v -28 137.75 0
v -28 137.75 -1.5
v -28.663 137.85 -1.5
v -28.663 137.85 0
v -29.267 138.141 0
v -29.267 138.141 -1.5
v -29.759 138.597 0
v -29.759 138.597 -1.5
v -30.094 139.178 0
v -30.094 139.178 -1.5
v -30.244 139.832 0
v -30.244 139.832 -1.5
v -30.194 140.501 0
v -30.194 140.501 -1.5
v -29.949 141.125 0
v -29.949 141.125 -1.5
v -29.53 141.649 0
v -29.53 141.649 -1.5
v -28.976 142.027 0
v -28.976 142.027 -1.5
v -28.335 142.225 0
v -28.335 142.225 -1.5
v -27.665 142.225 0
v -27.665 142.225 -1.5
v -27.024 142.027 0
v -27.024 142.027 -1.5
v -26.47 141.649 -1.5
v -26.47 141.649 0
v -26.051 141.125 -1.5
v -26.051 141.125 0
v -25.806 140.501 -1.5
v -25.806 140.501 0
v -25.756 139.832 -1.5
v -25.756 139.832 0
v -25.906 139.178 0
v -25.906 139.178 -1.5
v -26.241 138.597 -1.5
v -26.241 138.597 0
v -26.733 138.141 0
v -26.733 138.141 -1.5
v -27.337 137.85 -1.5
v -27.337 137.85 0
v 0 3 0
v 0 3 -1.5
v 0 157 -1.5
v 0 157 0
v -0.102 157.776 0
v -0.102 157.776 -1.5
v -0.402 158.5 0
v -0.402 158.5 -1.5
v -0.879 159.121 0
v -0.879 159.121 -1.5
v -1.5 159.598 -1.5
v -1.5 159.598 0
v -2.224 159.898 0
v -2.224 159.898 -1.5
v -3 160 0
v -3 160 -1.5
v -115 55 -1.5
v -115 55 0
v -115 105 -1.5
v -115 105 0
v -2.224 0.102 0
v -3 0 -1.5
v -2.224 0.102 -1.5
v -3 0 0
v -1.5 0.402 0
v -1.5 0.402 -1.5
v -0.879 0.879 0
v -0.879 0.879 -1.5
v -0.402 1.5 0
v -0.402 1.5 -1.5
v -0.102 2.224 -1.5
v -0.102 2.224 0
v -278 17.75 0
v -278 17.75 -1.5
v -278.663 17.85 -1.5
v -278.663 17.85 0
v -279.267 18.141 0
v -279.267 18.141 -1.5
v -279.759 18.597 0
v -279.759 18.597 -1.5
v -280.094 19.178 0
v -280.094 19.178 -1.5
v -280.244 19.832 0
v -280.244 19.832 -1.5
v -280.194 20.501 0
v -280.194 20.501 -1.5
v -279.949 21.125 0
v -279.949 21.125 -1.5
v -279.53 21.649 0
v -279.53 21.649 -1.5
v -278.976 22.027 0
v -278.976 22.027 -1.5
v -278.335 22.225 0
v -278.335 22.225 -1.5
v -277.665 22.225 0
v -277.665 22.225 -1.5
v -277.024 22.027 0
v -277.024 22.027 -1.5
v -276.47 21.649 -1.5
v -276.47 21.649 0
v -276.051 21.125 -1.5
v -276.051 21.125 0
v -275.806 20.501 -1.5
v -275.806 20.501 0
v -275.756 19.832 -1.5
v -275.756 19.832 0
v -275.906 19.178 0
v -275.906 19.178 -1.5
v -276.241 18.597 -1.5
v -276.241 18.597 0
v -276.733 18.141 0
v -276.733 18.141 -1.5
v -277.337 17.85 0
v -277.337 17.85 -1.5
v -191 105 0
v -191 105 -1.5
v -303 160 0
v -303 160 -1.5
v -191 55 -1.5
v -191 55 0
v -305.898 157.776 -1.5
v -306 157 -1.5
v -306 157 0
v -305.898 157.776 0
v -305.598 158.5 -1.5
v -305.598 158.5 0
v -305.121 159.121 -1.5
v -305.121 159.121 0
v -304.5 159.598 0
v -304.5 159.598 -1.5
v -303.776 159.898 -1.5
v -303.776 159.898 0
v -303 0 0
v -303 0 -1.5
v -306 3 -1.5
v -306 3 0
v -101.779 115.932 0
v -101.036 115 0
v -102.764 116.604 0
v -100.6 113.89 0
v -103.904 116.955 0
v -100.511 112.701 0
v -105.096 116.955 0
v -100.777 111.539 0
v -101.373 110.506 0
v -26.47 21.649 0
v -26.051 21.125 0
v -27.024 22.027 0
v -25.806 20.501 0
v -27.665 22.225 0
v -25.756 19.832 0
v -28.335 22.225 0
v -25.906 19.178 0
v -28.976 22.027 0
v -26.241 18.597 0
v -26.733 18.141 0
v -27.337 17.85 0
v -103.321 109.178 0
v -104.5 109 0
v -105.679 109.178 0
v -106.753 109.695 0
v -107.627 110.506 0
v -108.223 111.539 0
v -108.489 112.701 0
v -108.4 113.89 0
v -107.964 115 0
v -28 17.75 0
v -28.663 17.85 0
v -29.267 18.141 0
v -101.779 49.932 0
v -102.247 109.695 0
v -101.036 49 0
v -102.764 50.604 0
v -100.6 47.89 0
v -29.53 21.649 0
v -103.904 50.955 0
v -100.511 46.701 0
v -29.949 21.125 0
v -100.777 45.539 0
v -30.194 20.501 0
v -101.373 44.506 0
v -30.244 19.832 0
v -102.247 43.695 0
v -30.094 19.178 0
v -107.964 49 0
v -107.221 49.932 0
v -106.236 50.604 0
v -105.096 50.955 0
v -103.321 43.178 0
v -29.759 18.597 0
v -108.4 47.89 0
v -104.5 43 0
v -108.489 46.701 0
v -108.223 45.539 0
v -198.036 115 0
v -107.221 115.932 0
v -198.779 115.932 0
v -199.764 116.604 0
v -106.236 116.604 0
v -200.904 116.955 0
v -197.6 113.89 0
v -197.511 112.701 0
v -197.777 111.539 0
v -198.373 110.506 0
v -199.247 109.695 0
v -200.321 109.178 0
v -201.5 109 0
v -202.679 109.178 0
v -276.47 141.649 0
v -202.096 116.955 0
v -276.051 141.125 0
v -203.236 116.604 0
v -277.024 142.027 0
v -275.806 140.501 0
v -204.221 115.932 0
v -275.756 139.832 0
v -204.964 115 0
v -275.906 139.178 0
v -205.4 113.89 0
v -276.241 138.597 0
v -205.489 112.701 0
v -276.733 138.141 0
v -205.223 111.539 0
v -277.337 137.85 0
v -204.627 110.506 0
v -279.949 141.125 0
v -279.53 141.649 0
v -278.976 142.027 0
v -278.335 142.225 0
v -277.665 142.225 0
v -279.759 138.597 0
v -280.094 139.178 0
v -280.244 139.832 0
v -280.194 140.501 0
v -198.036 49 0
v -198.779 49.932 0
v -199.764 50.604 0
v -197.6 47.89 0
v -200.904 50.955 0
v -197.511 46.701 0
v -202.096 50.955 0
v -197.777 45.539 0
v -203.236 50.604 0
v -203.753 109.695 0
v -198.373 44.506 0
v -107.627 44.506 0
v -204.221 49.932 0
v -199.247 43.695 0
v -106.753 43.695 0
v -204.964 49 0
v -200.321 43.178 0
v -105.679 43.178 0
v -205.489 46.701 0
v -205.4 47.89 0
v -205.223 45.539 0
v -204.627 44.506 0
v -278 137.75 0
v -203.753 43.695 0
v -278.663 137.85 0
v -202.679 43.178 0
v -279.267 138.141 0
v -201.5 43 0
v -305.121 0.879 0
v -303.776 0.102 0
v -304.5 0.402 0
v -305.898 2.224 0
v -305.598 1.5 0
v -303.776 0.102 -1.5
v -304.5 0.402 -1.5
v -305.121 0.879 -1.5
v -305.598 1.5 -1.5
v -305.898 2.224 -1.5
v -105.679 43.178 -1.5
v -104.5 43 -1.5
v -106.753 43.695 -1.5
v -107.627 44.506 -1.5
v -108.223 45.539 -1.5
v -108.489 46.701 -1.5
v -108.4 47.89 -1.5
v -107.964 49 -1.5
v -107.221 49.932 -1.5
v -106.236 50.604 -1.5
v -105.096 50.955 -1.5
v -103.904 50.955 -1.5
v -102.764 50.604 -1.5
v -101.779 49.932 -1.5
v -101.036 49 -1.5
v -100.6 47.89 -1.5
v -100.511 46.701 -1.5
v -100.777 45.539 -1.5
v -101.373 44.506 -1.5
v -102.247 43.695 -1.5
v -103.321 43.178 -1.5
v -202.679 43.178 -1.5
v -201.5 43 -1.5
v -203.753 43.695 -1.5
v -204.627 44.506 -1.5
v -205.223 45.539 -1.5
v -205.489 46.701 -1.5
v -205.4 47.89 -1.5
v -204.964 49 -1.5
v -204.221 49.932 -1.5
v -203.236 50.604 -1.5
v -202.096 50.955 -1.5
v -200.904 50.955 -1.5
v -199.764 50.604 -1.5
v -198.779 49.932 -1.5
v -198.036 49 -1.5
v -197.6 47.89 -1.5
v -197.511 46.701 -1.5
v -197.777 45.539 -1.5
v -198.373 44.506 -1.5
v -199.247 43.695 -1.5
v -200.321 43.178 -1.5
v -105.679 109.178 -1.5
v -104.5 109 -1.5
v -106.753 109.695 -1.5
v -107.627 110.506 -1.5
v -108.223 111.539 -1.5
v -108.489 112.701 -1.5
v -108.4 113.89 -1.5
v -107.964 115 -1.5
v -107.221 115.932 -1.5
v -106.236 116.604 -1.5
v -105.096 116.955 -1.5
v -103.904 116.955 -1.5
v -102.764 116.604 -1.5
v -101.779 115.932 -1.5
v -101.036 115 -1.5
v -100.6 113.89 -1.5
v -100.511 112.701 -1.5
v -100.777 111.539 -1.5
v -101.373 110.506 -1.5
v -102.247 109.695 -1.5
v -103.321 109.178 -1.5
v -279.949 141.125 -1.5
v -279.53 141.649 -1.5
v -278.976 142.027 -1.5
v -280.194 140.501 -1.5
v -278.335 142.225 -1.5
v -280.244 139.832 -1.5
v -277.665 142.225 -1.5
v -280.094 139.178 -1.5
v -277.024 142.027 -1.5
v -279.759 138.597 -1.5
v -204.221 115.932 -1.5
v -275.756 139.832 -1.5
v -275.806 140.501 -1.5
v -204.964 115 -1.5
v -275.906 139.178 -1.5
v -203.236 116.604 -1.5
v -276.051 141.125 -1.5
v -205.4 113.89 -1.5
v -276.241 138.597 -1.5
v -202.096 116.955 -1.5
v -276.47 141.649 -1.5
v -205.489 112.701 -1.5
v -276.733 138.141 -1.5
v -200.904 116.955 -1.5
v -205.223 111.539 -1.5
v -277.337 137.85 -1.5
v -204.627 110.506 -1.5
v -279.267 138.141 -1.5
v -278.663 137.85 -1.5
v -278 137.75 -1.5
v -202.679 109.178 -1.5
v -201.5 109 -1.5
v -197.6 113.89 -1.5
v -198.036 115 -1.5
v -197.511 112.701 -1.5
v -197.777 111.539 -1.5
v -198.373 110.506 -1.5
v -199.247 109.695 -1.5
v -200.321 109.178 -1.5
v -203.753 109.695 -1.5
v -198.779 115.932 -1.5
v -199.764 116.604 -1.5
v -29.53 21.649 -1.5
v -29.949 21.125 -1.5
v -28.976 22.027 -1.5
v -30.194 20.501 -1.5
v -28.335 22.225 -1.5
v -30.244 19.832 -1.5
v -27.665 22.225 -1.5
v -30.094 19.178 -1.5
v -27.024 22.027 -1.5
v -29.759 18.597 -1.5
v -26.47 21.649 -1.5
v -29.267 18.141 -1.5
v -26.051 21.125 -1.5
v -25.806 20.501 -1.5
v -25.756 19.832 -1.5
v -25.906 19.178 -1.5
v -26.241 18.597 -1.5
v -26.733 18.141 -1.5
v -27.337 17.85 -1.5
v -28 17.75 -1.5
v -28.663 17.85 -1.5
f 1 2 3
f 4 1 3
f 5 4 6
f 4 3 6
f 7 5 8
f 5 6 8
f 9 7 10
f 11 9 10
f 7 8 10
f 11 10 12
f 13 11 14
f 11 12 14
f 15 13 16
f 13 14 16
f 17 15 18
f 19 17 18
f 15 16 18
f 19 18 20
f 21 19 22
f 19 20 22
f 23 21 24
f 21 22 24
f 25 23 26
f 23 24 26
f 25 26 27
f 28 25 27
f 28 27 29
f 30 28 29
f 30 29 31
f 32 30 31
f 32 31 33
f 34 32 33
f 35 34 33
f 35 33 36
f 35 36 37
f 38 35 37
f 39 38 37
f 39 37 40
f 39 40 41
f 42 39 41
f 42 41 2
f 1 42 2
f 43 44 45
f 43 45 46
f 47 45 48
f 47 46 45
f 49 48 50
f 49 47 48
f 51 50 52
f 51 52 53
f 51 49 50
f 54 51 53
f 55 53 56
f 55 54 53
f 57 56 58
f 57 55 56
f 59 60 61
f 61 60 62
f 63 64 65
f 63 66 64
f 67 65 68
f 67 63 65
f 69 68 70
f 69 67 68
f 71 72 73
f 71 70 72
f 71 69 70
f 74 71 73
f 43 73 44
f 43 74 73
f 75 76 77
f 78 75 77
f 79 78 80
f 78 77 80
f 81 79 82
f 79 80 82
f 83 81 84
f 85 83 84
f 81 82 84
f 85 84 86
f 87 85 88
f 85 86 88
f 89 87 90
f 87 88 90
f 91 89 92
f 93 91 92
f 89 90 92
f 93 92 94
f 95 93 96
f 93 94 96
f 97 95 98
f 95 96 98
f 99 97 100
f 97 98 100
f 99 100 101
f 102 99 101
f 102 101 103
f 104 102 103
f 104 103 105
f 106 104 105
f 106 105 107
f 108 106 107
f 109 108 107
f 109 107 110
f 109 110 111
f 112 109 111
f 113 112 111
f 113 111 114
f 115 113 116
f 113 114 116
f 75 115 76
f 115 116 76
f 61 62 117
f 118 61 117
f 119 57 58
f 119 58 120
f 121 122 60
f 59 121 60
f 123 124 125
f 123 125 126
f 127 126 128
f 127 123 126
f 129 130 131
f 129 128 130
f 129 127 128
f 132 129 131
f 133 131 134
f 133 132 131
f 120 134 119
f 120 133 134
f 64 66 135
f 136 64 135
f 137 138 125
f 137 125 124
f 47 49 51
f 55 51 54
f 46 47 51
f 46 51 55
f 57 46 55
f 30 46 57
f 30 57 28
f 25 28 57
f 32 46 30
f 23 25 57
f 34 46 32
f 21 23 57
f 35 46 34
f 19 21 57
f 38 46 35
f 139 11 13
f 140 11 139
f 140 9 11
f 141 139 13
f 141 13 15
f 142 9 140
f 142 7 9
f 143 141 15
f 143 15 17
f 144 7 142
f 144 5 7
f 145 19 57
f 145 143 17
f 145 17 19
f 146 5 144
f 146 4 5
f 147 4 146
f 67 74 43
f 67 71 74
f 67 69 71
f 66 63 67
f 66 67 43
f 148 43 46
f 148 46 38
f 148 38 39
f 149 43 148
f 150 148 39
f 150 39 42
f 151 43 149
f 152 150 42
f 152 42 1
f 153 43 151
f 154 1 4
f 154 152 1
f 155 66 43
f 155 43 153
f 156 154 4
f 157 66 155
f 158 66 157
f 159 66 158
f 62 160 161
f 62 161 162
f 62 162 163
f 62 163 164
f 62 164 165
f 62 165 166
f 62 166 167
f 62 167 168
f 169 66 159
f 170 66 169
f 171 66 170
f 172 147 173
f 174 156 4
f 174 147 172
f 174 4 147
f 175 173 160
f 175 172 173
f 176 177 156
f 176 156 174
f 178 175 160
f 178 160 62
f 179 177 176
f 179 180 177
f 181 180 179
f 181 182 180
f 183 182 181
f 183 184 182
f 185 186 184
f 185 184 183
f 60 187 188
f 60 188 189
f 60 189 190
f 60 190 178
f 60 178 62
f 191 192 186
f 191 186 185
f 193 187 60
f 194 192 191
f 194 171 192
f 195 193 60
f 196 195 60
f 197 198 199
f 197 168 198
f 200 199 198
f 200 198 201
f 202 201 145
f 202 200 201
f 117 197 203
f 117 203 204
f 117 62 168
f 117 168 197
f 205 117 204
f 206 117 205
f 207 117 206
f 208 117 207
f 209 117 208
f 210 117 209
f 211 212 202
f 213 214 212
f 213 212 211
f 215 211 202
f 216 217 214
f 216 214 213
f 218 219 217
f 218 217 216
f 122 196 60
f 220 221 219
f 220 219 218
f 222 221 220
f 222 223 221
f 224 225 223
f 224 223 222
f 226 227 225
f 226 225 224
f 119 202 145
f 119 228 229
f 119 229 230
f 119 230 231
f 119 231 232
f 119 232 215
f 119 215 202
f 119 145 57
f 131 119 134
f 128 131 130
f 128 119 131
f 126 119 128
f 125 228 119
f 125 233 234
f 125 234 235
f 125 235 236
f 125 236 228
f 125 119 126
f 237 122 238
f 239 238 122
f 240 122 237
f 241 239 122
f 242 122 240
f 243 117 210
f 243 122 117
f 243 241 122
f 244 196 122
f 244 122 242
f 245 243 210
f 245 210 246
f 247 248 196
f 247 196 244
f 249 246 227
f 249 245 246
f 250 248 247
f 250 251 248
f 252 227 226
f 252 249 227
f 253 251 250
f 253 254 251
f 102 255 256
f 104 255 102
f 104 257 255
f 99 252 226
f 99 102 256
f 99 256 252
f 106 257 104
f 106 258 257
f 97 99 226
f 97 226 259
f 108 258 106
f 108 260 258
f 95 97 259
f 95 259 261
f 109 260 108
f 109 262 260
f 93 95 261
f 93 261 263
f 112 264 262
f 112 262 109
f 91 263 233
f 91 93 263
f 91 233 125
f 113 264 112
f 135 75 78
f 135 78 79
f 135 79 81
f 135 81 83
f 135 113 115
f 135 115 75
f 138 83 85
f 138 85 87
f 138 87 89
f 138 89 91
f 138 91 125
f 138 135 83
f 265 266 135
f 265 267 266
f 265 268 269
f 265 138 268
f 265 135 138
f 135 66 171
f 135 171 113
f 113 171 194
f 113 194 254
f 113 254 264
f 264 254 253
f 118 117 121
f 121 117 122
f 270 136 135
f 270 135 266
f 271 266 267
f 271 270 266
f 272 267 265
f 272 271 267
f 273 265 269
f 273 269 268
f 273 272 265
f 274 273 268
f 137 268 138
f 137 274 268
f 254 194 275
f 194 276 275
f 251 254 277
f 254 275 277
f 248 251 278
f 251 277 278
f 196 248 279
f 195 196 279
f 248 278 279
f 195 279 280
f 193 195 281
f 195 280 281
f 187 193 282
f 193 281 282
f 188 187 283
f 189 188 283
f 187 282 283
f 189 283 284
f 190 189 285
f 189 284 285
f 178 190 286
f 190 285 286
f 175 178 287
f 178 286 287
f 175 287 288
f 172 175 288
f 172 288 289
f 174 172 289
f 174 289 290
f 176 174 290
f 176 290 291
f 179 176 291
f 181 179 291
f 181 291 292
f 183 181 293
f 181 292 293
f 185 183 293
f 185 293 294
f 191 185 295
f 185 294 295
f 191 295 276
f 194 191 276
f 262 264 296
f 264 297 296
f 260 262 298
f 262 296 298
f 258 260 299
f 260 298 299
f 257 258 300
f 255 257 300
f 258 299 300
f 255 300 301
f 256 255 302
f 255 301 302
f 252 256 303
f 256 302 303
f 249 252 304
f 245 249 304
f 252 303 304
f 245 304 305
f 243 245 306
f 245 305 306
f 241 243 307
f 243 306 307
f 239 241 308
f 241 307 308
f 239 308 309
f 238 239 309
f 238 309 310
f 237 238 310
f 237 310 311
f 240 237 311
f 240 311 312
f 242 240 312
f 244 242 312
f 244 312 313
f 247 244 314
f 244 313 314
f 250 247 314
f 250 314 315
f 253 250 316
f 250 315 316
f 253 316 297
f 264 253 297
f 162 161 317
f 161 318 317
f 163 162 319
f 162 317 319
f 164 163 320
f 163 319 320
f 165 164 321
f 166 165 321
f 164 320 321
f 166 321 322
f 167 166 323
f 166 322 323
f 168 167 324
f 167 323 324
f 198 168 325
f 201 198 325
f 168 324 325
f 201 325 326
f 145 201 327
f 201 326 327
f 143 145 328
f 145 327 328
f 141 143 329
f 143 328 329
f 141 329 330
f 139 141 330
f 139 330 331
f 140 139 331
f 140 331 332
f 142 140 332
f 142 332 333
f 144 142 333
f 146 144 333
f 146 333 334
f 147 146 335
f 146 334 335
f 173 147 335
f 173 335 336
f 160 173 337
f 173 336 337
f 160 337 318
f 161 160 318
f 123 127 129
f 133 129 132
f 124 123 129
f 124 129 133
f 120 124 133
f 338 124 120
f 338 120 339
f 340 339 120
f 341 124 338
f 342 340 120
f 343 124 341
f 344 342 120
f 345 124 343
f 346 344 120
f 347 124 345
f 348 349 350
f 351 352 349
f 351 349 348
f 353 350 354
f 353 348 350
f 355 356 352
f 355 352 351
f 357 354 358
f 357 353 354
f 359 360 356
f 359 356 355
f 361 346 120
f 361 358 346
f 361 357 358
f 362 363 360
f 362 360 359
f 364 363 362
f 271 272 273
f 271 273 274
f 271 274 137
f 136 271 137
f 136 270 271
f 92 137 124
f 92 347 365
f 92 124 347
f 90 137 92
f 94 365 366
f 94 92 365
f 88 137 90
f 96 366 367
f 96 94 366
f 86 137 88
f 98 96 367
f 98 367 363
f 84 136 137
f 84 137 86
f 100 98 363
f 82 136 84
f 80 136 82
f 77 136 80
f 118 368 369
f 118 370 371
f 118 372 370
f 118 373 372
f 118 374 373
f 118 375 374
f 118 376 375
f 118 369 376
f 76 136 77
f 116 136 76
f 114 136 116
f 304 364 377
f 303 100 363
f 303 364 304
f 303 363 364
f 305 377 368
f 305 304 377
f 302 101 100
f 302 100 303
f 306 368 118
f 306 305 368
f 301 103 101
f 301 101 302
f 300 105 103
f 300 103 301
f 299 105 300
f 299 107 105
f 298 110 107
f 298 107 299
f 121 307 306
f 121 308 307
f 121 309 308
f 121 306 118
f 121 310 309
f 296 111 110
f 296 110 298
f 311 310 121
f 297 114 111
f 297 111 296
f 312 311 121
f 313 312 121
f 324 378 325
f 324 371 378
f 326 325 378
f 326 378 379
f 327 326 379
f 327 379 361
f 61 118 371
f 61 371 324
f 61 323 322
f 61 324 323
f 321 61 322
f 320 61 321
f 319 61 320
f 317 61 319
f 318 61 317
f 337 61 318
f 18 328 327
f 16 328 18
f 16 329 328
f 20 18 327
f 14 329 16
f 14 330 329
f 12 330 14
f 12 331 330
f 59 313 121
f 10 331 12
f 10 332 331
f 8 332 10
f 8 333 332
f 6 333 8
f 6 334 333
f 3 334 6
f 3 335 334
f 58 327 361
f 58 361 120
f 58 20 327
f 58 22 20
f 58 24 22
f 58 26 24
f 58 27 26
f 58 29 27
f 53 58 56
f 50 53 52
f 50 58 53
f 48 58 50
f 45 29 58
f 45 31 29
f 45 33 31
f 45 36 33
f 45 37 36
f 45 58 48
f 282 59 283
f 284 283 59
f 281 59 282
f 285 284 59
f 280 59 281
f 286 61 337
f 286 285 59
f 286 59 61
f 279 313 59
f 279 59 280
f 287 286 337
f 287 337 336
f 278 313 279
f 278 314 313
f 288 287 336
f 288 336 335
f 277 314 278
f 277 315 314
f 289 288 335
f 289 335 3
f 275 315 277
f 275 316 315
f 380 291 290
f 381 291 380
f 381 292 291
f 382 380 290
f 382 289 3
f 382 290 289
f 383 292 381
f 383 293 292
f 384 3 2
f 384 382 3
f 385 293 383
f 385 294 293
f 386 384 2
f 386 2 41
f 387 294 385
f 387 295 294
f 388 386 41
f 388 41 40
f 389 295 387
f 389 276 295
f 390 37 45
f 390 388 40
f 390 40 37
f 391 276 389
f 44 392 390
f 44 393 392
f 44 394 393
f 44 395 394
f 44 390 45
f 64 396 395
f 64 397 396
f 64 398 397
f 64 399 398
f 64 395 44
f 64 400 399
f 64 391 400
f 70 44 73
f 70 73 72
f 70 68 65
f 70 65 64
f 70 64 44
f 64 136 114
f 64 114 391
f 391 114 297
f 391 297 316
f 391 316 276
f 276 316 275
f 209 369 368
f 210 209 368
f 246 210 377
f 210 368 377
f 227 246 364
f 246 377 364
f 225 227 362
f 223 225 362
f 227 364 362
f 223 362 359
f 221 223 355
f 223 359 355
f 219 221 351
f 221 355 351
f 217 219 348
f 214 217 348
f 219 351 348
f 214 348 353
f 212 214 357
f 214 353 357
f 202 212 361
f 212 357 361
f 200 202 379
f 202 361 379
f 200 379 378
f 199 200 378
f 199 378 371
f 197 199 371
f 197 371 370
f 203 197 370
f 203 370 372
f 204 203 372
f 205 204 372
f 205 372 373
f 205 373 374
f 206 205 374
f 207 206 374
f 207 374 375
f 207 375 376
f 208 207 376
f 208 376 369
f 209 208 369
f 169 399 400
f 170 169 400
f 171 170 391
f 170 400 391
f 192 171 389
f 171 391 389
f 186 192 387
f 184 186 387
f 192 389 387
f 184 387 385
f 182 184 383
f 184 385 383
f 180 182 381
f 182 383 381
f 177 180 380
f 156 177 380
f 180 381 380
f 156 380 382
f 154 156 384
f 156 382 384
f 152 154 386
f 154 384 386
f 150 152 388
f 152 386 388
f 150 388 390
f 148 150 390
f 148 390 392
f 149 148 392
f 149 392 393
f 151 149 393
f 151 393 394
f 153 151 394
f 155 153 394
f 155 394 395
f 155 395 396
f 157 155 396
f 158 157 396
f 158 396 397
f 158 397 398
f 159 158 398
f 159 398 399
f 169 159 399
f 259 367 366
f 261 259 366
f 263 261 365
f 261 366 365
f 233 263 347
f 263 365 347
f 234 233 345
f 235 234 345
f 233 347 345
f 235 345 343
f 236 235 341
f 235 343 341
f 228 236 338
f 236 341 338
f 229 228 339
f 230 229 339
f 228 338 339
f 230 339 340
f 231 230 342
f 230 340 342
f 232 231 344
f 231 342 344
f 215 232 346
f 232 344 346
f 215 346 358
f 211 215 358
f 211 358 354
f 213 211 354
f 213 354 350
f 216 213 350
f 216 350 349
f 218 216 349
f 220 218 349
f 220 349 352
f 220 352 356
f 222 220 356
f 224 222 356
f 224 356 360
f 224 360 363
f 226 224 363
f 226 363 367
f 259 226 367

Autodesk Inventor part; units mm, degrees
ref_plane "YZ Plane" through (0, 0, 0) normal (1, 0, 0) x (0, 1, 0)
ref_plane "XZ Plane" through (0, 0, 0) normal (0, 1, 0) x (-1, 0, 0)
ref_plane "XY Plane" through (0, 0, 0) normal (0, 0, 1) x (1, 0, 0)
sketch "Skizze1" plane through (0, 0, 0) normal (0, 1, 0) x (-1, 0, 0)
  line L0 (0, 0) -> (306, 0)
  line L1 (306, 0) -> (306, -1.5)
  line L2 (306, -1.5) -> (0, -1.5)
  line L3 (0, -1.5) -> (0, 0)
  dimension "d0" = 306
  dimension "d1" = 1.5
extrude "Extrusion1" add sketch "Skizze1" along normal blind 160
sketch "Skizze2" plane through (-306, 0, 0) normal (0, 0, 1) x (1, 0, 0)
  line L0 (278, 20) -> (28, 20)
  line L1 (28, 20) -> (28, 140)
  line L2 (28, 140) -> (278, 140)
  line L3 (278, 140) -> (278, 20)
  line L4 (278, 20) -> (28, 140) construction
  line L5 (28, 20) -> (278, 140) construction
  line L6 (0, 0) -> (0, 160) projected
  line L7 (0, 160) -> (306, 160) projected
  point P0 (306, 0)
  point P1 (153, 80)
  dimension "d4" = 306
  dimension "d5" = 160
  dimension "d6" = 153
  dimension "d7" = 80
  dimension "d8" = 250
  dimension "d9" = 120
hole "Bohrung1" at (-28, 20, 0) at (-28, 140, 0) at (-278, 140, 0) at (-278, 20, 0) direction (0, 0, -1) diameter 4.5 depth 11.8 tip angle 118
fillet "Rundung1" radius 3 4 edges at (-306, 160, -0.75) (-306, 0, -0.75) (0, 160, -0.75) (0, 0, -0.75)
sketch "Skizze3" plane through (-303, 0, 0) normal (0, 0, 1) x (1, 0, 0)
  arc A0 (0, 160) -> (-3, 157) centre (0, 157) ccw projected
  arc A1 (300, 0) -> (303, 3) centre (300, 3) ccw projected
  line L0 (0, 157) -> (300, 3)
  arc A2 (303, 157) -> (300, 160) centre (300, 157) ccw projected
  arc A3 (-3, 3) -> (0, 0) centre (0, 3) ccw projected
  line L1 (300, 157) -> (0, 3)
  line L2 (112, 55) -> (188, 55)
  line L3 (188, 55) -> (188, 105)
  line L4 (188, 105) -> (112, 105)
  line L5 (112, 105) -> (112, 55)
  line L6 (112, 55) -> (188, 105) construction
  line L7 (188, 55) -> (112, 105) construction
  point P0 (303, 0)
  point P1 (150, 80)
  dimension "d18" = 76
  dimension "d19" = 50
extrude "Extrusion2" cut sketch "Skizze3" against normal through all
sketch "Skizze4" plane through (-303, 0, 0) normal (0, 0, 1) x (1, 0, 0)
  line L0 (112, 105) -> (188, 105) projected
  line L1 (188, 105) -> (188, 55) projected
  line L2 (112, 105) -> (188, 55)
  line L3 (112, 55) -> (188, 55) projected
  line L4 (188, 105) -> (112, 55)
  line L5 (101.5, 47) -> (198.5, 47)
  line L6 (198.5, 47) -> (198.5, 113)
  line L7 (198.5, 113) -> (101.5, 113)
  line L8 (101.5, 113) -> (101.5, 47)
  line L9 (101.5, 47) -> (198.5, 113) construction
  line L10 (198.5, 47) -> (101.5, 113) construction
  point P0 (303, 0)
  point P1 (150, 80)
  dimension "d22" = 97
  dimension "d23" = 66
hole "Bohrung2" at (-201.5, 113, 0) at (-104.5, 113, 0) at (-104.5, 47, 0) at (-201.5, 47, 0) direction (0, 0, -1) diameter 8 end through all
equation "\"d6\" = 0.5 * d4"
equation "\"d7\" = 0.5 * d5"
properties part number "Deckel 2,0"
